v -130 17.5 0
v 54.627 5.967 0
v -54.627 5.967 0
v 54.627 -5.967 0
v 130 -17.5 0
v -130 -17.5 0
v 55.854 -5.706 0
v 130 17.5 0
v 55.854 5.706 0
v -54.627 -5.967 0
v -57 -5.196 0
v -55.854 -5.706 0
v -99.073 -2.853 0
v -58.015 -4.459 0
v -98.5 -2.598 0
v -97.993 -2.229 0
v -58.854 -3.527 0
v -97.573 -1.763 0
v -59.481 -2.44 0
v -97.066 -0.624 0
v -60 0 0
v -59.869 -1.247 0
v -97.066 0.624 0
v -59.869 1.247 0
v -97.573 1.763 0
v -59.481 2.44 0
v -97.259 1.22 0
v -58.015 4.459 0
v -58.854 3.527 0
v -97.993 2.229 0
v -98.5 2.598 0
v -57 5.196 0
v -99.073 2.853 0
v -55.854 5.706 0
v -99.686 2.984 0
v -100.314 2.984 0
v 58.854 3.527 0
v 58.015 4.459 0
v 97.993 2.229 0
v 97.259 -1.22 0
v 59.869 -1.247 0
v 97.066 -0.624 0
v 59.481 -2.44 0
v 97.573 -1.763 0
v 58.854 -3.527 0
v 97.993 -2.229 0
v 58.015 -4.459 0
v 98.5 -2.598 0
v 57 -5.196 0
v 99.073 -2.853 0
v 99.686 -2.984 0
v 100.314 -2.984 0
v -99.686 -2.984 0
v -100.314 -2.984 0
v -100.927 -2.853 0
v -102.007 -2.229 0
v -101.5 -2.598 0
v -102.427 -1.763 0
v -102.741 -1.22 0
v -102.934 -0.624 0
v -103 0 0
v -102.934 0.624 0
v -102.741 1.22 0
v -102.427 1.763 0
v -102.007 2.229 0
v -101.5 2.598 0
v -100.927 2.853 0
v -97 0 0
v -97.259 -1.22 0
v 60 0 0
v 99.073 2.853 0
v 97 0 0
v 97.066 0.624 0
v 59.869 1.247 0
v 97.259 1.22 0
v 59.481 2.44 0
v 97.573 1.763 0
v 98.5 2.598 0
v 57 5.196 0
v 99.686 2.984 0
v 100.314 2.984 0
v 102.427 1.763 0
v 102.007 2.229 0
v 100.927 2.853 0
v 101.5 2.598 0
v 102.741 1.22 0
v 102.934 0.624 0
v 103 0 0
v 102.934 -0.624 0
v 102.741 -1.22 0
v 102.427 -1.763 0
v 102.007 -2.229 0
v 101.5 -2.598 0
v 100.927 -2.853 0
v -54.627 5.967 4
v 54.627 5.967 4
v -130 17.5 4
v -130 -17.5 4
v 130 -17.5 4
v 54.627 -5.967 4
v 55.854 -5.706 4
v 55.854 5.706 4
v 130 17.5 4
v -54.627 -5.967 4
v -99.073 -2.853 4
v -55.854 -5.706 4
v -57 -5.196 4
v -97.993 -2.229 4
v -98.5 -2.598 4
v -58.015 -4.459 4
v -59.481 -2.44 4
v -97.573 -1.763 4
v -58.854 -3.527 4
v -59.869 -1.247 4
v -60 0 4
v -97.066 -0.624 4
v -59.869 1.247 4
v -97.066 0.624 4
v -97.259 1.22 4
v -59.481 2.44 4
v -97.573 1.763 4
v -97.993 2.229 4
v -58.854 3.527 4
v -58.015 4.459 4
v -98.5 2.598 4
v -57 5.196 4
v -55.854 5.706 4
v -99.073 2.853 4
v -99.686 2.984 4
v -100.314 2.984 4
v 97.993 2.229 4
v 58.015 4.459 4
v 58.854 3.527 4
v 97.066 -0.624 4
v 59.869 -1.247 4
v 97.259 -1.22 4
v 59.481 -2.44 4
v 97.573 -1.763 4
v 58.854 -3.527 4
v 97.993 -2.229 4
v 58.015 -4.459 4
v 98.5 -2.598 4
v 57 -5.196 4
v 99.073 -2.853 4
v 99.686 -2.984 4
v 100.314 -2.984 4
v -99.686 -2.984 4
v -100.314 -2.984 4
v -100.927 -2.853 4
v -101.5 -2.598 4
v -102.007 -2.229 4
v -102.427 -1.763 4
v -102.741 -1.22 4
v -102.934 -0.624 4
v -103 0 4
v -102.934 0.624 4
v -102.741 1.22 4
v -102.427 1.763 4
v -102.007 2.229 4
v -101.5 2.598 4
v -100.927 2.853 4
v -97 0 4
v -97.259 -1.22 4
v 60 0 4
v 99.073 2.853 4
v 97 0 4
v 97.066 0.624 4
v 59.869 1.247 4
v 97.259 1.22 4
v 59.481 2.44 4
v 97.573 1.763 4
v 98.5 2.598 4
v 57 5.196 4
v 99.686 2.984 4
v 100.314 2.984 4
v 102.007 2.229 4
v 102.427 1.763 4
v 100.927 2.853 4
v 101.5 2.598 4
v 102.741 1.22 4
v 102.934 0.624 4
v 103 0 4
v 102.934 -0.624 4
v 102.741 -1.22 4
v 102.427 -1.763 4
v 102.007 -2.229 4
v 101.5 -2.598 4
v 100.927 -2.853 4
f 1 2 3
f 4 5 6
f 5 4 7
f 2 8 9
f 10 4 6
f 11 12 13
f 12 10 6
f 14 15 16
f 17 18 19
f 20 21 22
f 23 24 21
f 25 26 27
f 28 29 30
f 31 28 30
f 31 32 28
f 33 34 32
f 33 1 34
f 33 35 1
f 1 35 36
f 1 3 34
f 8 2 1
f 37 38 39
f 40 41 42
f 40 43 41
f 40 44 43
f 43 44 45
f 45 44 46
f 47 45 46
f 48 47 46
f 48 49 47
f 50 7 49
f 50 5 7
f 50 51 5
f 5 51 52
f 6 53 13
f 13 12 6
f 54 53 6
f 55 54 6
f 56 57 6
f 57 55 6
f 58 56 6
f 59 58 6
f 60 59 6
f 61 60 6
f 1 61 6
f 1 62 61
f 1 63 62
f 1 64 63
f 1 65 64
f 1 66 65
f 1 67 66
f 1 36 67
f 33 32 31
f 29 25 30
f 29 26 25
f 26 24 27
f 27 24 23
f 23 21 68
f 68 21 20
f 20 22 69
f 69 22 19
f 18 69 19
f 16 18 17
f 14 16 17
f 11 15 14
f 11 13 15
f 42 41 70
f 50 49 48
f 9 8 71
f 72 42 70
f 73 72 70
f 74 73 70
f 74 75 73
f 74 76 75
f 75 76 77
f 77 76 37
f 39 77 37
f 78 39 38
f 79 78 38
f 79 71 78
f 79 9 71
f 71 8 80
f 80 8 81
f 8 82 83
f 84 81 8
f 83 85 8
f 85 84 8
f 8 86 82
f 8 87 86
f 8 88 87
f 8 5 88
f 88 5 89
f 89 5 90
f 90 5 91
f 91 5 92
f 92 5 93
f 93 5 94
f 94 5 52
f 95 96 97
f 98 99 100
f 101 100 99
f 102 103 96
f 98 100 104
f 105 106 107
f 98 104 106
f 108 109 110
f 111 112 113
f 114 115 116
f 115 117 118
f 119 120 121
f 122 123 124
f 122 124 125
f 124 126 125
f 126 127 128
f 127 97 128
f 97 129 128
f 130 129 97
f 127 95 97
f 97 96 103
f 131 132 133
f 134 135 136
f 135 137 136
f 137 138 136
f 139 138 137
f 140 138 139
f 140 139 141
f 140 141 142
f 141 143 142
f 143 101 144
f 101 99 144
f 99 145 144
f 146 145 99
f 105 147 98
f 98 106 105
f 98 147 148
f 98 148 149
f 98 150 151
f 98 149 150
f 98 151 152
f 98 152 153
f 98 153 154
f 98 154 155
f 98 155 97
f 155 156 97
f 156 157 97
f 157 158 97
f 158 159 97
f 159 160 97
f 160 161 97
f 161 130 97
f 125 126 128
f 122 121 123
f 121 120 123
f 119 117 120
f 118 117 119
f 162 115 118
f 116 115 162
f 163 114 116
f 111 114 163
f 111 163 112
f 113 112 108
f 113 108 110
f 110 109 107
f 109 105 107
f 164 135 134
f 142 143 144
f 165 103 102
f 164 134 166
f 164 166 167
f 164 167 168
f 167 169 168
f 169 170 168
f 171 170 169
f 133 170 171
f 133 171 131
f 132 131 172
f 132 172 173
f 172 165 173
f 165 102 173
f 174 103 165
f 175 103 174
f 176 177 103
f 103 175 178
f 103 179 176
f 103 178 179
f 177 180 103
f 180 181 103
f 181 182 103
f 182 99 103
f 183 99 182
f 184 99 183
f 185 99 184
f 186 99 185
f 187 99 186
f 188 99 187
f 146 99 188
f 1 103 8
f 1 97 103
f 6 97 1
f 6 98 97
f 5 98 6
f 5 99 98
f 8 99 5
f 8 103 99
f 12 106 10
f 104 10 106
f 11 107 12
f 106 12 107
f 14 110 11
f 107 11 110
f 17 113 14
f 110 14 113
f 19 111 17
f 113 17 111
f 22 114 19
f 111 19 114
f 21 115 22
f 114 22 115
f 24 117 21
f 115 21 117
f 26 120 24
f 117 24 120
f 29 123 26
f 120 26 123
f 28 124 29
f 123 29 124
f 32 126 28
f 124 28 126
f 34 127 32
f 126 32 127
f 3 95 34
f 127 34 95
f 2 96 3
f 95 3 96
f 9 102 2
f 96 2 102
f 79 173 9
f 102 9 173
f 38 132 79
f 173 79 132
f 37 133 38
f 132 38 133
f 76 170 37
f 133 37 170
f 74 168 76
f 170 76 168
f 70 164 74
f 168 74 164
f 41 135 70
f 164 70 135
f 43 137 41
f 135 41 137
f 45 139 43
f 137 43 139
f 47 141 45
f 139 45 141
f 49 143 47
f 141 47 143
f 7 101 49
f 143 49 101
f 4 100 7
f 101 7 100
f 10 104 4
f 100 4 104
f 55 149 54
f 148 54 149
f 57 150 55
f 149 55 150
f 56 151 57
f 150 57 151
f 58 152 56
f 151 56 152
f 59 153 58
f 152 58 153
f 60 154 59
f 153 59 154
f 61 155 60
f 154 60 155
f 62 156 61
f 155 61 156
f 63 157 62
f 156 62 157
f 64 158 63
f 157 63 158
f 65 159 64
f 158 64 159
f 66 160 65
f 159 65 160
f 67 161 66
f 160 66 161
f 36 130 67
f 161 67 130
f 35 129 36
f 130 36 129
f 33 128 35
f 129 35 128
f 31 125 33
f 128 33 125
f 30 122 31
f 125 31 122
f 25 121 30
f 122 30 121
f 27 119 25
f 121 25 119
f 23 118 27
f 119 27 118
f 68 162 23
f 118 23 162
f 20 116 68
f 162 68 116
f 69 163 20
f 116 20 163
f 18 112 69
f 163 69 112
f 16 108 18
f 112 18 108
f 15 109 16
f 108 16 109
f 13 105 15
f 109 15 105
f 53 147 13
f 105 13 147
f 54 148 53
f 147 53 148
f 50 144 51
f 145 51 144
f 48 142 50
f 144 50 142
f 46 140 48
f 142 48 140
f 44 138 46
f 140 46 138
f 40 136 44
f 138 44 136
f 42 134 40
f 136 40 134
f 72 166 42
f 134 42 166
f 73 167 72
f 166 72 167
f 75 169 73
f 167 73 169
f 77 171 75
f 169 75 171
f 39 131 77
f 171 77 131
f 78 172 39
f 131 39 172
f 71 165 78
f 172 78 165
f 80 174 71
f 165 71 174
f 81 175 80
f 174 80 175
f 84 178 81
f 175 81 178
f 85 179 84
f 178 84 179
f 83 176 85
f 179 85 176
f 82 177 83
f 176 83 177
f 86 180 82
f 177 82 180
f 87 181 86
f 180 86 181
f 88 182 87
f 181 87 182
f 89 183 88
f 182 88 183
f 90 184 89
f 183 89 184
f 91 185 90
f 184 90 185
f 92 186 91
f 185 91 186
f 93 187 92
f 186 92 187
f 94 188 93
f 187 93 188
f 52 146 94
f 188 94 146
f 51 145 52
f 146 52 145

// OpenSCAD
plate_w = 260;
plate_h = 35;
plate_t = 4;

linear_extrude(height=plate_t)
  difference(){
    square([plate_w, plate_h], center=true);
    translate([-100,0]) circle(d=6.0,$fn=30);
    translate([ 100,0]) circle(d=6.0,$fn=30);
    hull(){
      translate([-54,0]) circle(d=12,$fn=30);
      translate([ 54,0]) circle(d=12,$fn=30);
    }
  }
